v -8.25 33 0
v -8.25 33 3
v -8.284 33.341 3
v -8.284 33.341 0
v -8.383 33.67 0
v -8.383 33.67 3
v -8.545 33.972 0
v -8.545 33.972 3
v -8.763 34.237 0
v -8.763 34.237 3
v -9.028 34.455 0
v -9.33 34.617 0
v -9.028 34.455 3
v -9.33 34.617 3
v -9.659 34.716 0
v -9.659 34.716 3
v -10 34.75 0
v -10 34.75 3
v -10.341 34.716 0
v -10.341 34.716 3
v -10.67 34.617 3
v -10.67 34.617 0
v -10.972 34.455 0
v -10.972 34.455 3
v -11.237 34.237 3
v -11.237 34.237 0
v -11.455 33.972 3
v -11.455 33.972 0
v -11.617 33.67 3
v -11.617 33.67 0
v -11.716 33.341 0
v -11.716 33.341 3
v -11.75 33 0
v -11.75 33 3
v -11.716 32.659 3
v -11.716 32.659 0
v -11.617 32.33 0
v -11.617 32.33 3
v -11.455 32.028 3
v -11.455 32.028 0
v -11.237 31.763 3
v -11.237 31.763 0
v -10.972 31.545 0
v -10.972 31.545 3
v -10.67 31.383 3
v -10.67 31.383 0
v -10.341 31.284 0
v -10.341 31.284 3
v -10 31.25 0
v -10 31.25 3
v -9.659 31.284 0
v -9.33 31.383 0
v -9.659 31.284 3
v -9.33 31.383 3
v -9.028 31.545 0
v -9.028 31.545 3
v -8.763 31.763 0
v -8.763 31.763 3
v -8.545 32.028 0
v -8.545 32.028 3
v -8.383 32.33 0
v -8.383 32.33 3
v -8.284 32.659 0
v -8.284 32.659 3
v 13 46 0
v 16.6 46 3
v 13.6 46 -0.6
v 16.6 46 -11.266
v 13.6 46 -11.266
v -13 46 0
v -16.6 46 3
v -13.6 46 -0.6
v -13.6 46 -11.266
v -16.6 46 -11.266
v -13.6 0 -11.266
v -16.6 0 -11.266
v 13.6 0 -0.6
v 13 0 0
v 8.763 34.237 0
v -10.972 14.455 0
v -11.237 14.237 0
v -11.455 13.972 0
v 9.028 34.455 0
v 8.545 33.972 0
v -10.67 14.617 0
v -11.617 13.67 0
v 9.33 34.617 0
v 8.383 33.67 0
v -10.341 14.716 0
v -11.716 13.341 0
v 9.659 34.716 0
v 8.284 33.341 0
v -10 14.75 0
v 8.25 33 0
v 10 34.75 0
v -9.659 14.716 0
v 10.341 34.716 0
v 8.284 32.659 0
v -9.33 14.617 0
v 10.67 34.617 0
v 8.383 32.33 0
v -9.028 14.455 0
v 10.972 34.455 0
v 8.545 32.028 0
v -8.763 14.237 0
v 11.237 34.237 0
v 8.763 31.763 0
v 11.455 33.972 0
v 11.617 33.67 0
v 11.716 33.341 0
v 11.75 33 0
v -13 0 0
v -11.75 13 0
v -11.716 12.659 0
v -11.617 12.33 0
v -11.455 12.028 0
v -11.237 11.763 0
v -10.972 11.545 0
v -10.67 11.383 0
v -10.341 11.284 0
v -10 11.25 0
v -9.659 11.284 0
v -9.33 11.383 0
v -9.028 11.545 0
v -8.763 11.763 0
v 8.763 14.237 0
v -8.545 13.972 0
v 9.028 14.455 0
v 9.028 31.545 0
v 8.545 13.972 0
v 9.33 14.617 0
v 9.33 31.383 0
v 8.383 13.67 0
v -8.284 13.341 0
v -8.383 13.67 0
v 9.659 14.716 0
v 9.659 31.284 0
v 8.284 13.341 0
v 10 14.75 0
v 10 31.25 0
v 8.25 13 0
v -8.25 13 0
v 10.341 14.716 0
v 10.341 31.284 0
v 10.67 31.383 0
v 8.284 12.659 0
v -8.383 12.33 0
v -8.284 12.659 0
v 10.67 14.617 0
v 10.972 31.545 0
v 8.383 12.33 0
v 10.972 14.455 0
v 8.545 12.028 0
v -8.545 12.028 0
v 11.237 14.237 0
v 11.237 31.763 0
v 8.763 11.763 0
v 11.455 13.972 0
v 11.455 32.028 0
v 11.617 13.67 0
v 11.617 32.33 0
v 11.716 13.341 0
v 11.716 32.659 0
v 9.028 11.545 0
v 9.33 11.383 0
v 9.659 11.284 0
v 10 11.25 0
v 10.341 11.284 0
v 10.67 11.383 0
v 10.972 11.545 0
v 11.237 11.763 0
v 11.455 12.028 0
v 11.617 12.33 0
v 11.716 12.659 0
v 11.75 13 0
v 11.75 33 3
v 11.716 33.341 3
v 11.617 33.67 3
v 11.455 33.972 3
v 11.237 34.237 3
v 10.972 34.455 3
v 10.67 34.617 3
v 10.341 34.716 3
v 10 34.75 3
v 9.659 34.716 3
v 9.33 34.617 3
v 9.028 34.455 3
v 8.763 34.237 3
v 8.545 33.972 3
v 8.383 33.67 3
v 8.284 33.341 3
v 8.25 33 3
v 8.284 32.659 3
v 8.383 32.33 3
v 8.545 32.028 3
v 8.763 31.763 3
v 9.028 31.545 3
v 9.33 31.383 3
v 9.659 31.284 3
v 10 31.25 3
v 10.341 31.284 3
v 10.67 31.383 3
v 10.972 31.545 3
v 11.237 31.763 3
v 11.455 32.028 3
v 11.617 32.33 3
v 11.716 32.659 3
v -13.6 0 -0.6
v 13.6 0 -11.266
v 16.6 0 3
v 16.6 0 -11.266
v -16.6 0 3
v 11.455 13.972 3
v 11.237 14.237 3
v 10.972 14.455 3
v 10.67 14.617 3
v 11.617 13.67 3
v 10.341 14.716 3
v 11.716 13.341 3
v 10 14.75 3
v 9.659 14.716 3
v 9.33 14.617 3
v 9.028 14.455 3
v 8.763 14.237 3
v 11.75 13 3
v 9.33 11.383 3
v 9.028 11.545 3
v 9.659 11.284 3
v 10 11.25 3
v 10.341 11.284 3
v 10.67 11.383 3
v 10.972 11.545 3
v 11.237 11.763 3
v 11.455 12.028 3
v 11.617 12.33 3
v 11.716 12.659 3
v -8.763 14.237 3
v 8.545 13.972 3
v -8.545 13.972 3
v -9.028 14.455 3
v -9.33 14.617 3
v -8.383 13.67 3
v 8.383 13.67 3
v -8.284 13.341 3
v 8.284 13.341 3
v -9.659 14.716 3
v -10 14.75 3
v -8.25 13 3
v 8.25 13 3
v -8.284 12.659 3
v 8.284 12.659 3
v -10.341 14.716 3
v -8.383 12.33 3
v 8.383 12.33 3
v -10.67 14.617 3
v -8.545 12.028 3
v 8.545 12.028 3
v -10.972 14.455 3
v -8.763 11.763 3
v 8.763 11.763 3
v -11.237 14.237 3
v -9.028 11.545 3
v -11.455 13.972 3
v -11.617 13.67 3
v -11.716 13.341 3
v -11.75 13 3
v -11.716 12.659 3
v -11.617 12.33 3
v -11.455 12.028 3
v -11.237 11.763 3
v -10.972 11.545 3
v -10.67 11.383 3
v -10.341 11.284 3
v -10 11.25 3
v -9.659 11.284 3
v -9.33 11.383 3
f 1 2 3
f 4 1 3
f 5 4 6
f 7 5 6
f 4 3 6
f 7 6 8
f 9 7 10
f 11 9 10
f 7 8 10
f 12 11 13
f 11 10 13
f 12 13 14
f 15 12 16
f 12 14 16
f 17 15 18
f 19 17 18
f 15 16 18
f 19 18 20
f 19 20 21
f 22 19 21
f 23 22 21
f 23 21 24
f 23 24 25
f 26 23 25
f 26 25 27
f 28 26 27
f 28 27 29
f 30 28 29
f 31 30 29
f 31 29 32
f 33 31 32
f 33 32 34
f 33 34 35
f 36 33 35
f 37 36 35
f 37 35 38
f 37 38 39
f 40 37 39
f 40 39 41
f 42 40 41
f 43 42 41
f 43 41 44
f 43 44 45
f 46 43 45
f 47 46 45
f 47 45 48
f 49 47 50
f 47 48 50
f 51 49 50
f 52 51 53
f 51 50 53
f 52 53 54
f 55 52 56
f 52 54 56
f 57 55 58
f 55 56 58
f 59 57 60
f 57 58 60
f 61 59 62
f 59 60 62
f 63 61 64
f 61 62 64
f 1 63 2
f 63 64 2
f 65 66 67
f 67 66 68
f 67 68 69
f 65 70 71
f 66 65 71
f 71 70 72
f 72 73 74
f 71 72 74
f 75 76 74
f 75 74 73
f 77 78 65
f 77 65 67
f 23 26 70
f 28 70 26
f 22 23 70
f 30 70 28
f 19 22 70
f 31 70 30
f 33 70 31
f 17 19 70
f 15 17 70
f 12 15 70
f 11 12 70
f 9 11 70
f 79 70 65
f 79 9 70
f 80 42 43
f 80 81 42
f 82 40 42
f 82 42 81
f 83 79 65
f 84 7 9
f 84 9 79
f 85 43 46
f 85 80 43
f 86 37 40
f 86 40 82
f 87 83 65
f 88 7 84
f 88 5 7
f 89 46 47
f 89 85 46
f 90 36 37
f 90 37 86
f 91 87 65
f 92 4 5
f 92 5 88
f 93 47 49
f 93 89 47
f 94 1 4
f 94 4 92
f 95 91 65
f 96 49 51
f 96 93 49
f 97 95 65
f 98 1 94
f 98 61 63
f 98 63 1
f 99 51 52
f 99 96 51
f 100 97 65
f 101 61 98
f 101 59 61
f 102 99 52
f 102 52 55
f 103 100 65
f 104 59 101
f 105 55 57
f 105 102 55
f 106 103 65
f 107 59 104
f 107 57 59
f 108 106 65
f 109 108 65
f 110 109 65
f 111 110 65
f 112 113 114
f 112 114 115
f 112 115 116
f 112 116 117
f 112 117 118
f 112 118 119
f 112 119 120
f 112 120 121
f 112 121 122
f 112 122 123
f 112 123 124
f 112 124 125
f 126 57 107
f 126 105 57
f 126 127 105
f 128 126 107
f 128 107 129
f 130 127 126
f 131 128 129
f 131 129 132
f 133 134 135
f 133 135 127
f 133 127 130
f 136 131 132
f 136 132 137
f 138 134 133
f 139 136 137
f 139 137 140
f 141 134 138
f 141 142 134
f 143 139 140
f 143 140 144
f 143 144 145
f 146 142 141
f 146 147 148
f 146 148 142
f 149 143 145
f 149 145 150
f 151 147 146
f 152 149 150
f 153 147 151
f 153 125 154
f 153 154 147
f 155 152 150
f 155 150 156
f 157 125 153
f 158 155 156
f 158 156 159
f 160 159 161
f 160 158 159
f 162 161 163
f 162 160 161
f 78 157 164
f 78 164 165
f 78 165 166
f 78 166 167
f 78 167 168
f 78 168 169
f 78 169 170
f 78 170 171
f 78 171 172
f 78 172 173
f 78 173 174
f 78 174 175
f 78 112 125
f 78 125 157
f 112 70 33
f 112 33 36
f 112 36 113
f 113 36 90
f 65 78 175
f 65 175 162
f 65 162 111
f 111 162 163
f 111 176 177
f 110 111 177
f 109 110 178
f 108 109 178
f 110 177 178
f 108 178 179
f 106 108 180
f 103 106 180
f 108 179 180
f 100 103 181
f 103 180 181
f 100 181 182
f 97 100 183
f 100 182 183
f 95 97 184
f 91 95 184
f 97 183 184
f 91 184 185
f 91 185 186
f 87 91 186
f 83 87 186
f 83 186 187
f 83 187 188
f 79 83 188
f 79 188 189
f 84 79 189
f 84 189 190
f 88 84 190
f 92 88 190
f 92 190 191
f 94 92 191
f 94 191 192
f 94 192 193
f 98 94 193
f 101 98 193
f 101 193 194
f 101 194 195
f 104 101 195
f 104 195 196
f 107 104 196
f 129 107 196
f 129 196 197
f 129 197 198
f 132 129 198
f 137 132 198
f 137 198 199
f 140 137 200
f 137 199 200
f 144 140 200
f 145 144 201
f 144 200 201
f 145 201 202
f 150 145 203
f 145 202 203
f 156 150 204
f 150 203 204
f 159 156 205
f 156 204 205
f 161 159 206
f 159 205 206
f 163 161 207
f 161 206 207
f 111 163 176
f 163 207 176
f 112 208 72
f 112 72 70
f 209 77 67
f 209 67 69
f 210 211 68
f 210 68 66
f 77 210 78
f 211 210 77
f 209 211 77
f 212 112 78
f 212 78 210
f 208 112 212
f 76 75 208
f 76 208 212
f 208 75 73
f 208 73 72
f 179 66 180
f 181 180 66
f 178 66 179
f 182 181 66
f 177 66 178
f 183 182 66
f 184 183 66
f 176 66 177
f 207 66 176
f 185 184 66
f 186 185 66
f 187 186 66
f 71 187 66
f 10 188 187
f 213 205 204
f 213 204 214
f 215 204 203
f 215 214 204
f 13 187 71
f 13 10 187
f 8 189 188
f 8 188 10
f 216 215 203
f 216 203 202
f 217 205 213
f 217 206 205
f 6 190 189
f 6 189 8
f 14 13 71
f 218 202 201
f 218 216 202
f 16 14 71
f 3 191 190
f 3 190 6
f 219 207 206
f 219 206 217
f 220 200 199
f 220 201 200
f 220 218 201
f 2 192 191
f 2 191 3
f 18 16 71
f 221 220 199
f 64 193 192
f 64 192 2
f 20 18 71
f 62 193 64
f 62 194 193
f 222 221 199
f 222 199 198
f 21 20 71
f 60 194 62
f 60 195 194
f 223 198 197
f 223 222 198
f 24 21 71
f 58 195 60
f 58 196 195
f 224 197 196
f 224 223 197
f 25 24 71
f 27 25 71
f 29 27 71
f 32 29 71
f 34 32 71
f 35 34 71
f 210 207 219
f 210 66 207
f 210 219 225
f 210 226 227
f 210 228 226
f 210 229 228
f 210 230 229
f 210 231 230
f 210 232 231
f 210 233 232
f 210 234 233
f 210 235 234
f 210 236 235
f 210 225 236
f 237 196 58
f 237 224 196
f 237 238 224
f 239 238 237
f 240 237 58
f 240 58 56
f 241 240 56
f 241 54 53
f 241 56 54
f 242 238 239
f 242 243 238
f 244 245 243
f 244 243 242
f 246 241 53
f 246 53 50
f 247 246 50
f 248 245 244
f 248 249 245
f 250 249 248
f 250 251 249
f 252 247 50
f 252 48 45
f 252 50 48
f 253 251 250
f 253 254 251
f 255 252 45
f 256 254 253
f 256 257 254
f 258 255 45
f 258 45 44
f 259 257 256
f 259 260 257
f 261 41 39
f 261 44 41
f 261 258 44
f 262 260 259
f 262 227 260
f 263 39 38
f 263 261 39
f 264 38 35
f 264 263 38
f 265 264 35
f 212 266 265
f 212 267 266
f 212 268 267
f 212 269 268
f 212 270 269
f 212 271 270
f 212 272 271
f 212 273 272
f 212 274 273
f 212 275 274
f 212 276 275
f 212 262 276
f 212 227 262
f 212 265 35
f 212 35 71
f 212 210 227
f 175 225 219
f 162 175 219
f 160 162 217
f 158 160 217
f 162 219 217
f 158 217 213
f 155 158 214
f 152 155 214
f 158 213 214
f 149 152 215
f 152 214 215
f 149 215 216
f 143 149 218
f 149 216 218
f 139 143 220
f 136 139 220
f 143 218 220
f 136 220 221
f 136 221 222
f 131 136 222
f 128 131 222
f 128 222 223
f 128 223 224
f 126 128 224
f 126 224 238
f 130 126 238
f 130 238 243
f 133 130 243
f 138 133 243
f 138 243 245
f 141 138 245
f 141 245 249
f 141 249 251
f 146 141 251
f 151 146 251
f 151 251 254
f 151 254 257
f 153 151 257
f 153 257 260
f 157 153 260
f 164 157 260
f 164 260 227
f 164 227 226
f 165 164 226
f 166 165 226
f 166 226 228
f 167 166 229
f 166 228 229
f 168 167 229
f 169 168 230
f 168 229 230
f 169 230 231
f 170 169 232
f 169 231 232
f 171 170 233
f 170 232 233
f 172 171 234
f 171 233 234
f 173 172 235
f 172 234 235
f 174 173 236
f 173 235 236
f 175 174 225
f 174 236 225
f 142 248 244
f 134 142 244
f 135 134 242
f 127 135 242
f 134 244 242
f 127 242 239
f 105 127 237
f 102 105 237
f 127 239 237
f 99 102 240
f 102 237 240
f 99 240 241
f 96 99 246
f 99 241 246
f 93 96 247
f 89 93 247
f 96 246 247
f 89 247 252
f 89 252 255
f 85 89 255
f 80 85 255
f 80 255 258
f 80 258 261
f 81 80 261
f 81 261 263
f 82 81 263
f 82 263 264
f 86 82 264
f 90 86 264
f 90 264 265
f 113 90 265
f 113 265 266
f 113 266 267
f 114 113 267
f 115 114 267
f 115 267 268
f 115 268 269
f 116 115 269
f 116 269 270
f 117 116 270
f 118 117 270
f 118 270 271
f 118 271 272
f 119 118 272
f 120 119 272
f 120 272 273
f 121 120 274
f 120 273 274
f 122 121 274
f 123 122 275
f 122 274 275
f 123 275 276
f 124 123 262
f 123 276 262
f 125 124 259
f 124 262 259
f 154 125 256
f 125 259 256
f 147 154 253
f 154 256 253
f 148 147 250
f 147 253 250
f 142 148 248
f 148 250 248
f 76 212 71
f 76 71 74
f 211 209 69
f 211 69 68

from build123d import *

# Parameters (mm, degrees)
BOSS_EXTRU_1_DEPTH      = 46
ENL_V_MAT_EXTRU_1_REACH = 52.942
ESQUISSE2_R             = 1.75


with BuildPart() as part:
    # Esquisse1 → Boss.-Extru.1 (new body)
    with BuildSketch(Plane(origin=(0, 0, 0), x_dir=(1, 0, 0), z_dir=(0, 1, 0))):
        Polygon((-13.6, 11.266030534), (-13.6, 0.6), (-13, 0), (13, 0), (13.6, 0.6), (13.6, 11.266030534), (16.6, 11.266030534), (16.6, -3), (-16.6, -3), (-16.6, 11.266030534), align=None)
    extrude(amount=BOSS_EXTRU_1_DEPTH)

    # Esquisse2 → Enlèv. mat.-Extru.1 (cut, up to next)
    with BuildSketch(Plane.XY.offset(3), mode=Mode.PRIVATE) as enl_v_mat_extru_1_sk1:
        with Locations((-10, 33)):
            Circle(ESQUISSE2_R)
    enl_v_mat_extru_1_tool1 = extrude(enl_v_mat_extru_1_sk1.sketch, amount=-ENL_V_MAT_EXTRU_1_REACH, mode=Mode.PRIVATE) & part.part
    # Esquisse2 → Enlèv. mat.-Extru.1 (cut, up to next)
    with BuildSketch(Plane.XY.offset(3), mode=Mode.PRIVATE) as enl_v_mat_extru_1_sk2:
        with Locations((10, 33)):
            Circle(ESQUISSE2_R)
    enl_v_mat_extru_1_tool2 = extrude(enl_v_mat_extru_1_sk2.sketch, amount=-ENL_V_MAT_EXTRU_1_REACH, mode=Mode.PRIVATE) & part.part
    # Esquisse2 → Enlèv. mat.-Extru.1 (cut, up to next)
    with BuildSketch(Plane.XY.offset(3), mode=Mode.PRIVATE) as enl_v_mat_extru_1_sk3:
        with Locations((10, 13)):
            Circle(ESQUISSE2_R)
    enl_v_mat_extru_1_tool3 = extrude(enl_v_mat_extru_1_sk3.sketch, amount=-ENL_V_MAT_EXTRU_1_REACH, mode=Mode.PRIVATE) & part.part
    # Esquisse2 → Enlèv. mat.-Extru.1 (cut, up to next)
    with BuildSketch(Plane.XY.offset(3), mode=Mode.PRIVATE) as enl_v_mat_extru_1_sk4:
        with Locations((-10, 13)):
            Circle(ESQUISSE2_R)
    enl_v_mat_extru_1_tool4 = extrude(enl_v_mat_extru_1_sk4.sketch, amount=-ENL_V_MAT_EXTRU_1_REACH, mode=Mode.PRIVATE) & part.part
    add(enl_v_mat_extru_1_tool1.solids().sort_by_distance((-10, 33, 3))[0], mode=Mode.SUBTRACT)
    add(enl_v_mat_extru_1_tool2.solids().sort_by_distance((10, 33, 3))[0], mode=Mode.SUBTRACT)
    add(enl_v_mat_extru_1_tool3.solids().sort_by_distance((10, 13, 3))[0], mode=Mode.SUBTRACT)
    add(enl_v_mat_extru_1_tool4.solids().sort_by_distance((-10, 13, 3))[0], mode=Mode.SUBTRACT)


solid = part.part
